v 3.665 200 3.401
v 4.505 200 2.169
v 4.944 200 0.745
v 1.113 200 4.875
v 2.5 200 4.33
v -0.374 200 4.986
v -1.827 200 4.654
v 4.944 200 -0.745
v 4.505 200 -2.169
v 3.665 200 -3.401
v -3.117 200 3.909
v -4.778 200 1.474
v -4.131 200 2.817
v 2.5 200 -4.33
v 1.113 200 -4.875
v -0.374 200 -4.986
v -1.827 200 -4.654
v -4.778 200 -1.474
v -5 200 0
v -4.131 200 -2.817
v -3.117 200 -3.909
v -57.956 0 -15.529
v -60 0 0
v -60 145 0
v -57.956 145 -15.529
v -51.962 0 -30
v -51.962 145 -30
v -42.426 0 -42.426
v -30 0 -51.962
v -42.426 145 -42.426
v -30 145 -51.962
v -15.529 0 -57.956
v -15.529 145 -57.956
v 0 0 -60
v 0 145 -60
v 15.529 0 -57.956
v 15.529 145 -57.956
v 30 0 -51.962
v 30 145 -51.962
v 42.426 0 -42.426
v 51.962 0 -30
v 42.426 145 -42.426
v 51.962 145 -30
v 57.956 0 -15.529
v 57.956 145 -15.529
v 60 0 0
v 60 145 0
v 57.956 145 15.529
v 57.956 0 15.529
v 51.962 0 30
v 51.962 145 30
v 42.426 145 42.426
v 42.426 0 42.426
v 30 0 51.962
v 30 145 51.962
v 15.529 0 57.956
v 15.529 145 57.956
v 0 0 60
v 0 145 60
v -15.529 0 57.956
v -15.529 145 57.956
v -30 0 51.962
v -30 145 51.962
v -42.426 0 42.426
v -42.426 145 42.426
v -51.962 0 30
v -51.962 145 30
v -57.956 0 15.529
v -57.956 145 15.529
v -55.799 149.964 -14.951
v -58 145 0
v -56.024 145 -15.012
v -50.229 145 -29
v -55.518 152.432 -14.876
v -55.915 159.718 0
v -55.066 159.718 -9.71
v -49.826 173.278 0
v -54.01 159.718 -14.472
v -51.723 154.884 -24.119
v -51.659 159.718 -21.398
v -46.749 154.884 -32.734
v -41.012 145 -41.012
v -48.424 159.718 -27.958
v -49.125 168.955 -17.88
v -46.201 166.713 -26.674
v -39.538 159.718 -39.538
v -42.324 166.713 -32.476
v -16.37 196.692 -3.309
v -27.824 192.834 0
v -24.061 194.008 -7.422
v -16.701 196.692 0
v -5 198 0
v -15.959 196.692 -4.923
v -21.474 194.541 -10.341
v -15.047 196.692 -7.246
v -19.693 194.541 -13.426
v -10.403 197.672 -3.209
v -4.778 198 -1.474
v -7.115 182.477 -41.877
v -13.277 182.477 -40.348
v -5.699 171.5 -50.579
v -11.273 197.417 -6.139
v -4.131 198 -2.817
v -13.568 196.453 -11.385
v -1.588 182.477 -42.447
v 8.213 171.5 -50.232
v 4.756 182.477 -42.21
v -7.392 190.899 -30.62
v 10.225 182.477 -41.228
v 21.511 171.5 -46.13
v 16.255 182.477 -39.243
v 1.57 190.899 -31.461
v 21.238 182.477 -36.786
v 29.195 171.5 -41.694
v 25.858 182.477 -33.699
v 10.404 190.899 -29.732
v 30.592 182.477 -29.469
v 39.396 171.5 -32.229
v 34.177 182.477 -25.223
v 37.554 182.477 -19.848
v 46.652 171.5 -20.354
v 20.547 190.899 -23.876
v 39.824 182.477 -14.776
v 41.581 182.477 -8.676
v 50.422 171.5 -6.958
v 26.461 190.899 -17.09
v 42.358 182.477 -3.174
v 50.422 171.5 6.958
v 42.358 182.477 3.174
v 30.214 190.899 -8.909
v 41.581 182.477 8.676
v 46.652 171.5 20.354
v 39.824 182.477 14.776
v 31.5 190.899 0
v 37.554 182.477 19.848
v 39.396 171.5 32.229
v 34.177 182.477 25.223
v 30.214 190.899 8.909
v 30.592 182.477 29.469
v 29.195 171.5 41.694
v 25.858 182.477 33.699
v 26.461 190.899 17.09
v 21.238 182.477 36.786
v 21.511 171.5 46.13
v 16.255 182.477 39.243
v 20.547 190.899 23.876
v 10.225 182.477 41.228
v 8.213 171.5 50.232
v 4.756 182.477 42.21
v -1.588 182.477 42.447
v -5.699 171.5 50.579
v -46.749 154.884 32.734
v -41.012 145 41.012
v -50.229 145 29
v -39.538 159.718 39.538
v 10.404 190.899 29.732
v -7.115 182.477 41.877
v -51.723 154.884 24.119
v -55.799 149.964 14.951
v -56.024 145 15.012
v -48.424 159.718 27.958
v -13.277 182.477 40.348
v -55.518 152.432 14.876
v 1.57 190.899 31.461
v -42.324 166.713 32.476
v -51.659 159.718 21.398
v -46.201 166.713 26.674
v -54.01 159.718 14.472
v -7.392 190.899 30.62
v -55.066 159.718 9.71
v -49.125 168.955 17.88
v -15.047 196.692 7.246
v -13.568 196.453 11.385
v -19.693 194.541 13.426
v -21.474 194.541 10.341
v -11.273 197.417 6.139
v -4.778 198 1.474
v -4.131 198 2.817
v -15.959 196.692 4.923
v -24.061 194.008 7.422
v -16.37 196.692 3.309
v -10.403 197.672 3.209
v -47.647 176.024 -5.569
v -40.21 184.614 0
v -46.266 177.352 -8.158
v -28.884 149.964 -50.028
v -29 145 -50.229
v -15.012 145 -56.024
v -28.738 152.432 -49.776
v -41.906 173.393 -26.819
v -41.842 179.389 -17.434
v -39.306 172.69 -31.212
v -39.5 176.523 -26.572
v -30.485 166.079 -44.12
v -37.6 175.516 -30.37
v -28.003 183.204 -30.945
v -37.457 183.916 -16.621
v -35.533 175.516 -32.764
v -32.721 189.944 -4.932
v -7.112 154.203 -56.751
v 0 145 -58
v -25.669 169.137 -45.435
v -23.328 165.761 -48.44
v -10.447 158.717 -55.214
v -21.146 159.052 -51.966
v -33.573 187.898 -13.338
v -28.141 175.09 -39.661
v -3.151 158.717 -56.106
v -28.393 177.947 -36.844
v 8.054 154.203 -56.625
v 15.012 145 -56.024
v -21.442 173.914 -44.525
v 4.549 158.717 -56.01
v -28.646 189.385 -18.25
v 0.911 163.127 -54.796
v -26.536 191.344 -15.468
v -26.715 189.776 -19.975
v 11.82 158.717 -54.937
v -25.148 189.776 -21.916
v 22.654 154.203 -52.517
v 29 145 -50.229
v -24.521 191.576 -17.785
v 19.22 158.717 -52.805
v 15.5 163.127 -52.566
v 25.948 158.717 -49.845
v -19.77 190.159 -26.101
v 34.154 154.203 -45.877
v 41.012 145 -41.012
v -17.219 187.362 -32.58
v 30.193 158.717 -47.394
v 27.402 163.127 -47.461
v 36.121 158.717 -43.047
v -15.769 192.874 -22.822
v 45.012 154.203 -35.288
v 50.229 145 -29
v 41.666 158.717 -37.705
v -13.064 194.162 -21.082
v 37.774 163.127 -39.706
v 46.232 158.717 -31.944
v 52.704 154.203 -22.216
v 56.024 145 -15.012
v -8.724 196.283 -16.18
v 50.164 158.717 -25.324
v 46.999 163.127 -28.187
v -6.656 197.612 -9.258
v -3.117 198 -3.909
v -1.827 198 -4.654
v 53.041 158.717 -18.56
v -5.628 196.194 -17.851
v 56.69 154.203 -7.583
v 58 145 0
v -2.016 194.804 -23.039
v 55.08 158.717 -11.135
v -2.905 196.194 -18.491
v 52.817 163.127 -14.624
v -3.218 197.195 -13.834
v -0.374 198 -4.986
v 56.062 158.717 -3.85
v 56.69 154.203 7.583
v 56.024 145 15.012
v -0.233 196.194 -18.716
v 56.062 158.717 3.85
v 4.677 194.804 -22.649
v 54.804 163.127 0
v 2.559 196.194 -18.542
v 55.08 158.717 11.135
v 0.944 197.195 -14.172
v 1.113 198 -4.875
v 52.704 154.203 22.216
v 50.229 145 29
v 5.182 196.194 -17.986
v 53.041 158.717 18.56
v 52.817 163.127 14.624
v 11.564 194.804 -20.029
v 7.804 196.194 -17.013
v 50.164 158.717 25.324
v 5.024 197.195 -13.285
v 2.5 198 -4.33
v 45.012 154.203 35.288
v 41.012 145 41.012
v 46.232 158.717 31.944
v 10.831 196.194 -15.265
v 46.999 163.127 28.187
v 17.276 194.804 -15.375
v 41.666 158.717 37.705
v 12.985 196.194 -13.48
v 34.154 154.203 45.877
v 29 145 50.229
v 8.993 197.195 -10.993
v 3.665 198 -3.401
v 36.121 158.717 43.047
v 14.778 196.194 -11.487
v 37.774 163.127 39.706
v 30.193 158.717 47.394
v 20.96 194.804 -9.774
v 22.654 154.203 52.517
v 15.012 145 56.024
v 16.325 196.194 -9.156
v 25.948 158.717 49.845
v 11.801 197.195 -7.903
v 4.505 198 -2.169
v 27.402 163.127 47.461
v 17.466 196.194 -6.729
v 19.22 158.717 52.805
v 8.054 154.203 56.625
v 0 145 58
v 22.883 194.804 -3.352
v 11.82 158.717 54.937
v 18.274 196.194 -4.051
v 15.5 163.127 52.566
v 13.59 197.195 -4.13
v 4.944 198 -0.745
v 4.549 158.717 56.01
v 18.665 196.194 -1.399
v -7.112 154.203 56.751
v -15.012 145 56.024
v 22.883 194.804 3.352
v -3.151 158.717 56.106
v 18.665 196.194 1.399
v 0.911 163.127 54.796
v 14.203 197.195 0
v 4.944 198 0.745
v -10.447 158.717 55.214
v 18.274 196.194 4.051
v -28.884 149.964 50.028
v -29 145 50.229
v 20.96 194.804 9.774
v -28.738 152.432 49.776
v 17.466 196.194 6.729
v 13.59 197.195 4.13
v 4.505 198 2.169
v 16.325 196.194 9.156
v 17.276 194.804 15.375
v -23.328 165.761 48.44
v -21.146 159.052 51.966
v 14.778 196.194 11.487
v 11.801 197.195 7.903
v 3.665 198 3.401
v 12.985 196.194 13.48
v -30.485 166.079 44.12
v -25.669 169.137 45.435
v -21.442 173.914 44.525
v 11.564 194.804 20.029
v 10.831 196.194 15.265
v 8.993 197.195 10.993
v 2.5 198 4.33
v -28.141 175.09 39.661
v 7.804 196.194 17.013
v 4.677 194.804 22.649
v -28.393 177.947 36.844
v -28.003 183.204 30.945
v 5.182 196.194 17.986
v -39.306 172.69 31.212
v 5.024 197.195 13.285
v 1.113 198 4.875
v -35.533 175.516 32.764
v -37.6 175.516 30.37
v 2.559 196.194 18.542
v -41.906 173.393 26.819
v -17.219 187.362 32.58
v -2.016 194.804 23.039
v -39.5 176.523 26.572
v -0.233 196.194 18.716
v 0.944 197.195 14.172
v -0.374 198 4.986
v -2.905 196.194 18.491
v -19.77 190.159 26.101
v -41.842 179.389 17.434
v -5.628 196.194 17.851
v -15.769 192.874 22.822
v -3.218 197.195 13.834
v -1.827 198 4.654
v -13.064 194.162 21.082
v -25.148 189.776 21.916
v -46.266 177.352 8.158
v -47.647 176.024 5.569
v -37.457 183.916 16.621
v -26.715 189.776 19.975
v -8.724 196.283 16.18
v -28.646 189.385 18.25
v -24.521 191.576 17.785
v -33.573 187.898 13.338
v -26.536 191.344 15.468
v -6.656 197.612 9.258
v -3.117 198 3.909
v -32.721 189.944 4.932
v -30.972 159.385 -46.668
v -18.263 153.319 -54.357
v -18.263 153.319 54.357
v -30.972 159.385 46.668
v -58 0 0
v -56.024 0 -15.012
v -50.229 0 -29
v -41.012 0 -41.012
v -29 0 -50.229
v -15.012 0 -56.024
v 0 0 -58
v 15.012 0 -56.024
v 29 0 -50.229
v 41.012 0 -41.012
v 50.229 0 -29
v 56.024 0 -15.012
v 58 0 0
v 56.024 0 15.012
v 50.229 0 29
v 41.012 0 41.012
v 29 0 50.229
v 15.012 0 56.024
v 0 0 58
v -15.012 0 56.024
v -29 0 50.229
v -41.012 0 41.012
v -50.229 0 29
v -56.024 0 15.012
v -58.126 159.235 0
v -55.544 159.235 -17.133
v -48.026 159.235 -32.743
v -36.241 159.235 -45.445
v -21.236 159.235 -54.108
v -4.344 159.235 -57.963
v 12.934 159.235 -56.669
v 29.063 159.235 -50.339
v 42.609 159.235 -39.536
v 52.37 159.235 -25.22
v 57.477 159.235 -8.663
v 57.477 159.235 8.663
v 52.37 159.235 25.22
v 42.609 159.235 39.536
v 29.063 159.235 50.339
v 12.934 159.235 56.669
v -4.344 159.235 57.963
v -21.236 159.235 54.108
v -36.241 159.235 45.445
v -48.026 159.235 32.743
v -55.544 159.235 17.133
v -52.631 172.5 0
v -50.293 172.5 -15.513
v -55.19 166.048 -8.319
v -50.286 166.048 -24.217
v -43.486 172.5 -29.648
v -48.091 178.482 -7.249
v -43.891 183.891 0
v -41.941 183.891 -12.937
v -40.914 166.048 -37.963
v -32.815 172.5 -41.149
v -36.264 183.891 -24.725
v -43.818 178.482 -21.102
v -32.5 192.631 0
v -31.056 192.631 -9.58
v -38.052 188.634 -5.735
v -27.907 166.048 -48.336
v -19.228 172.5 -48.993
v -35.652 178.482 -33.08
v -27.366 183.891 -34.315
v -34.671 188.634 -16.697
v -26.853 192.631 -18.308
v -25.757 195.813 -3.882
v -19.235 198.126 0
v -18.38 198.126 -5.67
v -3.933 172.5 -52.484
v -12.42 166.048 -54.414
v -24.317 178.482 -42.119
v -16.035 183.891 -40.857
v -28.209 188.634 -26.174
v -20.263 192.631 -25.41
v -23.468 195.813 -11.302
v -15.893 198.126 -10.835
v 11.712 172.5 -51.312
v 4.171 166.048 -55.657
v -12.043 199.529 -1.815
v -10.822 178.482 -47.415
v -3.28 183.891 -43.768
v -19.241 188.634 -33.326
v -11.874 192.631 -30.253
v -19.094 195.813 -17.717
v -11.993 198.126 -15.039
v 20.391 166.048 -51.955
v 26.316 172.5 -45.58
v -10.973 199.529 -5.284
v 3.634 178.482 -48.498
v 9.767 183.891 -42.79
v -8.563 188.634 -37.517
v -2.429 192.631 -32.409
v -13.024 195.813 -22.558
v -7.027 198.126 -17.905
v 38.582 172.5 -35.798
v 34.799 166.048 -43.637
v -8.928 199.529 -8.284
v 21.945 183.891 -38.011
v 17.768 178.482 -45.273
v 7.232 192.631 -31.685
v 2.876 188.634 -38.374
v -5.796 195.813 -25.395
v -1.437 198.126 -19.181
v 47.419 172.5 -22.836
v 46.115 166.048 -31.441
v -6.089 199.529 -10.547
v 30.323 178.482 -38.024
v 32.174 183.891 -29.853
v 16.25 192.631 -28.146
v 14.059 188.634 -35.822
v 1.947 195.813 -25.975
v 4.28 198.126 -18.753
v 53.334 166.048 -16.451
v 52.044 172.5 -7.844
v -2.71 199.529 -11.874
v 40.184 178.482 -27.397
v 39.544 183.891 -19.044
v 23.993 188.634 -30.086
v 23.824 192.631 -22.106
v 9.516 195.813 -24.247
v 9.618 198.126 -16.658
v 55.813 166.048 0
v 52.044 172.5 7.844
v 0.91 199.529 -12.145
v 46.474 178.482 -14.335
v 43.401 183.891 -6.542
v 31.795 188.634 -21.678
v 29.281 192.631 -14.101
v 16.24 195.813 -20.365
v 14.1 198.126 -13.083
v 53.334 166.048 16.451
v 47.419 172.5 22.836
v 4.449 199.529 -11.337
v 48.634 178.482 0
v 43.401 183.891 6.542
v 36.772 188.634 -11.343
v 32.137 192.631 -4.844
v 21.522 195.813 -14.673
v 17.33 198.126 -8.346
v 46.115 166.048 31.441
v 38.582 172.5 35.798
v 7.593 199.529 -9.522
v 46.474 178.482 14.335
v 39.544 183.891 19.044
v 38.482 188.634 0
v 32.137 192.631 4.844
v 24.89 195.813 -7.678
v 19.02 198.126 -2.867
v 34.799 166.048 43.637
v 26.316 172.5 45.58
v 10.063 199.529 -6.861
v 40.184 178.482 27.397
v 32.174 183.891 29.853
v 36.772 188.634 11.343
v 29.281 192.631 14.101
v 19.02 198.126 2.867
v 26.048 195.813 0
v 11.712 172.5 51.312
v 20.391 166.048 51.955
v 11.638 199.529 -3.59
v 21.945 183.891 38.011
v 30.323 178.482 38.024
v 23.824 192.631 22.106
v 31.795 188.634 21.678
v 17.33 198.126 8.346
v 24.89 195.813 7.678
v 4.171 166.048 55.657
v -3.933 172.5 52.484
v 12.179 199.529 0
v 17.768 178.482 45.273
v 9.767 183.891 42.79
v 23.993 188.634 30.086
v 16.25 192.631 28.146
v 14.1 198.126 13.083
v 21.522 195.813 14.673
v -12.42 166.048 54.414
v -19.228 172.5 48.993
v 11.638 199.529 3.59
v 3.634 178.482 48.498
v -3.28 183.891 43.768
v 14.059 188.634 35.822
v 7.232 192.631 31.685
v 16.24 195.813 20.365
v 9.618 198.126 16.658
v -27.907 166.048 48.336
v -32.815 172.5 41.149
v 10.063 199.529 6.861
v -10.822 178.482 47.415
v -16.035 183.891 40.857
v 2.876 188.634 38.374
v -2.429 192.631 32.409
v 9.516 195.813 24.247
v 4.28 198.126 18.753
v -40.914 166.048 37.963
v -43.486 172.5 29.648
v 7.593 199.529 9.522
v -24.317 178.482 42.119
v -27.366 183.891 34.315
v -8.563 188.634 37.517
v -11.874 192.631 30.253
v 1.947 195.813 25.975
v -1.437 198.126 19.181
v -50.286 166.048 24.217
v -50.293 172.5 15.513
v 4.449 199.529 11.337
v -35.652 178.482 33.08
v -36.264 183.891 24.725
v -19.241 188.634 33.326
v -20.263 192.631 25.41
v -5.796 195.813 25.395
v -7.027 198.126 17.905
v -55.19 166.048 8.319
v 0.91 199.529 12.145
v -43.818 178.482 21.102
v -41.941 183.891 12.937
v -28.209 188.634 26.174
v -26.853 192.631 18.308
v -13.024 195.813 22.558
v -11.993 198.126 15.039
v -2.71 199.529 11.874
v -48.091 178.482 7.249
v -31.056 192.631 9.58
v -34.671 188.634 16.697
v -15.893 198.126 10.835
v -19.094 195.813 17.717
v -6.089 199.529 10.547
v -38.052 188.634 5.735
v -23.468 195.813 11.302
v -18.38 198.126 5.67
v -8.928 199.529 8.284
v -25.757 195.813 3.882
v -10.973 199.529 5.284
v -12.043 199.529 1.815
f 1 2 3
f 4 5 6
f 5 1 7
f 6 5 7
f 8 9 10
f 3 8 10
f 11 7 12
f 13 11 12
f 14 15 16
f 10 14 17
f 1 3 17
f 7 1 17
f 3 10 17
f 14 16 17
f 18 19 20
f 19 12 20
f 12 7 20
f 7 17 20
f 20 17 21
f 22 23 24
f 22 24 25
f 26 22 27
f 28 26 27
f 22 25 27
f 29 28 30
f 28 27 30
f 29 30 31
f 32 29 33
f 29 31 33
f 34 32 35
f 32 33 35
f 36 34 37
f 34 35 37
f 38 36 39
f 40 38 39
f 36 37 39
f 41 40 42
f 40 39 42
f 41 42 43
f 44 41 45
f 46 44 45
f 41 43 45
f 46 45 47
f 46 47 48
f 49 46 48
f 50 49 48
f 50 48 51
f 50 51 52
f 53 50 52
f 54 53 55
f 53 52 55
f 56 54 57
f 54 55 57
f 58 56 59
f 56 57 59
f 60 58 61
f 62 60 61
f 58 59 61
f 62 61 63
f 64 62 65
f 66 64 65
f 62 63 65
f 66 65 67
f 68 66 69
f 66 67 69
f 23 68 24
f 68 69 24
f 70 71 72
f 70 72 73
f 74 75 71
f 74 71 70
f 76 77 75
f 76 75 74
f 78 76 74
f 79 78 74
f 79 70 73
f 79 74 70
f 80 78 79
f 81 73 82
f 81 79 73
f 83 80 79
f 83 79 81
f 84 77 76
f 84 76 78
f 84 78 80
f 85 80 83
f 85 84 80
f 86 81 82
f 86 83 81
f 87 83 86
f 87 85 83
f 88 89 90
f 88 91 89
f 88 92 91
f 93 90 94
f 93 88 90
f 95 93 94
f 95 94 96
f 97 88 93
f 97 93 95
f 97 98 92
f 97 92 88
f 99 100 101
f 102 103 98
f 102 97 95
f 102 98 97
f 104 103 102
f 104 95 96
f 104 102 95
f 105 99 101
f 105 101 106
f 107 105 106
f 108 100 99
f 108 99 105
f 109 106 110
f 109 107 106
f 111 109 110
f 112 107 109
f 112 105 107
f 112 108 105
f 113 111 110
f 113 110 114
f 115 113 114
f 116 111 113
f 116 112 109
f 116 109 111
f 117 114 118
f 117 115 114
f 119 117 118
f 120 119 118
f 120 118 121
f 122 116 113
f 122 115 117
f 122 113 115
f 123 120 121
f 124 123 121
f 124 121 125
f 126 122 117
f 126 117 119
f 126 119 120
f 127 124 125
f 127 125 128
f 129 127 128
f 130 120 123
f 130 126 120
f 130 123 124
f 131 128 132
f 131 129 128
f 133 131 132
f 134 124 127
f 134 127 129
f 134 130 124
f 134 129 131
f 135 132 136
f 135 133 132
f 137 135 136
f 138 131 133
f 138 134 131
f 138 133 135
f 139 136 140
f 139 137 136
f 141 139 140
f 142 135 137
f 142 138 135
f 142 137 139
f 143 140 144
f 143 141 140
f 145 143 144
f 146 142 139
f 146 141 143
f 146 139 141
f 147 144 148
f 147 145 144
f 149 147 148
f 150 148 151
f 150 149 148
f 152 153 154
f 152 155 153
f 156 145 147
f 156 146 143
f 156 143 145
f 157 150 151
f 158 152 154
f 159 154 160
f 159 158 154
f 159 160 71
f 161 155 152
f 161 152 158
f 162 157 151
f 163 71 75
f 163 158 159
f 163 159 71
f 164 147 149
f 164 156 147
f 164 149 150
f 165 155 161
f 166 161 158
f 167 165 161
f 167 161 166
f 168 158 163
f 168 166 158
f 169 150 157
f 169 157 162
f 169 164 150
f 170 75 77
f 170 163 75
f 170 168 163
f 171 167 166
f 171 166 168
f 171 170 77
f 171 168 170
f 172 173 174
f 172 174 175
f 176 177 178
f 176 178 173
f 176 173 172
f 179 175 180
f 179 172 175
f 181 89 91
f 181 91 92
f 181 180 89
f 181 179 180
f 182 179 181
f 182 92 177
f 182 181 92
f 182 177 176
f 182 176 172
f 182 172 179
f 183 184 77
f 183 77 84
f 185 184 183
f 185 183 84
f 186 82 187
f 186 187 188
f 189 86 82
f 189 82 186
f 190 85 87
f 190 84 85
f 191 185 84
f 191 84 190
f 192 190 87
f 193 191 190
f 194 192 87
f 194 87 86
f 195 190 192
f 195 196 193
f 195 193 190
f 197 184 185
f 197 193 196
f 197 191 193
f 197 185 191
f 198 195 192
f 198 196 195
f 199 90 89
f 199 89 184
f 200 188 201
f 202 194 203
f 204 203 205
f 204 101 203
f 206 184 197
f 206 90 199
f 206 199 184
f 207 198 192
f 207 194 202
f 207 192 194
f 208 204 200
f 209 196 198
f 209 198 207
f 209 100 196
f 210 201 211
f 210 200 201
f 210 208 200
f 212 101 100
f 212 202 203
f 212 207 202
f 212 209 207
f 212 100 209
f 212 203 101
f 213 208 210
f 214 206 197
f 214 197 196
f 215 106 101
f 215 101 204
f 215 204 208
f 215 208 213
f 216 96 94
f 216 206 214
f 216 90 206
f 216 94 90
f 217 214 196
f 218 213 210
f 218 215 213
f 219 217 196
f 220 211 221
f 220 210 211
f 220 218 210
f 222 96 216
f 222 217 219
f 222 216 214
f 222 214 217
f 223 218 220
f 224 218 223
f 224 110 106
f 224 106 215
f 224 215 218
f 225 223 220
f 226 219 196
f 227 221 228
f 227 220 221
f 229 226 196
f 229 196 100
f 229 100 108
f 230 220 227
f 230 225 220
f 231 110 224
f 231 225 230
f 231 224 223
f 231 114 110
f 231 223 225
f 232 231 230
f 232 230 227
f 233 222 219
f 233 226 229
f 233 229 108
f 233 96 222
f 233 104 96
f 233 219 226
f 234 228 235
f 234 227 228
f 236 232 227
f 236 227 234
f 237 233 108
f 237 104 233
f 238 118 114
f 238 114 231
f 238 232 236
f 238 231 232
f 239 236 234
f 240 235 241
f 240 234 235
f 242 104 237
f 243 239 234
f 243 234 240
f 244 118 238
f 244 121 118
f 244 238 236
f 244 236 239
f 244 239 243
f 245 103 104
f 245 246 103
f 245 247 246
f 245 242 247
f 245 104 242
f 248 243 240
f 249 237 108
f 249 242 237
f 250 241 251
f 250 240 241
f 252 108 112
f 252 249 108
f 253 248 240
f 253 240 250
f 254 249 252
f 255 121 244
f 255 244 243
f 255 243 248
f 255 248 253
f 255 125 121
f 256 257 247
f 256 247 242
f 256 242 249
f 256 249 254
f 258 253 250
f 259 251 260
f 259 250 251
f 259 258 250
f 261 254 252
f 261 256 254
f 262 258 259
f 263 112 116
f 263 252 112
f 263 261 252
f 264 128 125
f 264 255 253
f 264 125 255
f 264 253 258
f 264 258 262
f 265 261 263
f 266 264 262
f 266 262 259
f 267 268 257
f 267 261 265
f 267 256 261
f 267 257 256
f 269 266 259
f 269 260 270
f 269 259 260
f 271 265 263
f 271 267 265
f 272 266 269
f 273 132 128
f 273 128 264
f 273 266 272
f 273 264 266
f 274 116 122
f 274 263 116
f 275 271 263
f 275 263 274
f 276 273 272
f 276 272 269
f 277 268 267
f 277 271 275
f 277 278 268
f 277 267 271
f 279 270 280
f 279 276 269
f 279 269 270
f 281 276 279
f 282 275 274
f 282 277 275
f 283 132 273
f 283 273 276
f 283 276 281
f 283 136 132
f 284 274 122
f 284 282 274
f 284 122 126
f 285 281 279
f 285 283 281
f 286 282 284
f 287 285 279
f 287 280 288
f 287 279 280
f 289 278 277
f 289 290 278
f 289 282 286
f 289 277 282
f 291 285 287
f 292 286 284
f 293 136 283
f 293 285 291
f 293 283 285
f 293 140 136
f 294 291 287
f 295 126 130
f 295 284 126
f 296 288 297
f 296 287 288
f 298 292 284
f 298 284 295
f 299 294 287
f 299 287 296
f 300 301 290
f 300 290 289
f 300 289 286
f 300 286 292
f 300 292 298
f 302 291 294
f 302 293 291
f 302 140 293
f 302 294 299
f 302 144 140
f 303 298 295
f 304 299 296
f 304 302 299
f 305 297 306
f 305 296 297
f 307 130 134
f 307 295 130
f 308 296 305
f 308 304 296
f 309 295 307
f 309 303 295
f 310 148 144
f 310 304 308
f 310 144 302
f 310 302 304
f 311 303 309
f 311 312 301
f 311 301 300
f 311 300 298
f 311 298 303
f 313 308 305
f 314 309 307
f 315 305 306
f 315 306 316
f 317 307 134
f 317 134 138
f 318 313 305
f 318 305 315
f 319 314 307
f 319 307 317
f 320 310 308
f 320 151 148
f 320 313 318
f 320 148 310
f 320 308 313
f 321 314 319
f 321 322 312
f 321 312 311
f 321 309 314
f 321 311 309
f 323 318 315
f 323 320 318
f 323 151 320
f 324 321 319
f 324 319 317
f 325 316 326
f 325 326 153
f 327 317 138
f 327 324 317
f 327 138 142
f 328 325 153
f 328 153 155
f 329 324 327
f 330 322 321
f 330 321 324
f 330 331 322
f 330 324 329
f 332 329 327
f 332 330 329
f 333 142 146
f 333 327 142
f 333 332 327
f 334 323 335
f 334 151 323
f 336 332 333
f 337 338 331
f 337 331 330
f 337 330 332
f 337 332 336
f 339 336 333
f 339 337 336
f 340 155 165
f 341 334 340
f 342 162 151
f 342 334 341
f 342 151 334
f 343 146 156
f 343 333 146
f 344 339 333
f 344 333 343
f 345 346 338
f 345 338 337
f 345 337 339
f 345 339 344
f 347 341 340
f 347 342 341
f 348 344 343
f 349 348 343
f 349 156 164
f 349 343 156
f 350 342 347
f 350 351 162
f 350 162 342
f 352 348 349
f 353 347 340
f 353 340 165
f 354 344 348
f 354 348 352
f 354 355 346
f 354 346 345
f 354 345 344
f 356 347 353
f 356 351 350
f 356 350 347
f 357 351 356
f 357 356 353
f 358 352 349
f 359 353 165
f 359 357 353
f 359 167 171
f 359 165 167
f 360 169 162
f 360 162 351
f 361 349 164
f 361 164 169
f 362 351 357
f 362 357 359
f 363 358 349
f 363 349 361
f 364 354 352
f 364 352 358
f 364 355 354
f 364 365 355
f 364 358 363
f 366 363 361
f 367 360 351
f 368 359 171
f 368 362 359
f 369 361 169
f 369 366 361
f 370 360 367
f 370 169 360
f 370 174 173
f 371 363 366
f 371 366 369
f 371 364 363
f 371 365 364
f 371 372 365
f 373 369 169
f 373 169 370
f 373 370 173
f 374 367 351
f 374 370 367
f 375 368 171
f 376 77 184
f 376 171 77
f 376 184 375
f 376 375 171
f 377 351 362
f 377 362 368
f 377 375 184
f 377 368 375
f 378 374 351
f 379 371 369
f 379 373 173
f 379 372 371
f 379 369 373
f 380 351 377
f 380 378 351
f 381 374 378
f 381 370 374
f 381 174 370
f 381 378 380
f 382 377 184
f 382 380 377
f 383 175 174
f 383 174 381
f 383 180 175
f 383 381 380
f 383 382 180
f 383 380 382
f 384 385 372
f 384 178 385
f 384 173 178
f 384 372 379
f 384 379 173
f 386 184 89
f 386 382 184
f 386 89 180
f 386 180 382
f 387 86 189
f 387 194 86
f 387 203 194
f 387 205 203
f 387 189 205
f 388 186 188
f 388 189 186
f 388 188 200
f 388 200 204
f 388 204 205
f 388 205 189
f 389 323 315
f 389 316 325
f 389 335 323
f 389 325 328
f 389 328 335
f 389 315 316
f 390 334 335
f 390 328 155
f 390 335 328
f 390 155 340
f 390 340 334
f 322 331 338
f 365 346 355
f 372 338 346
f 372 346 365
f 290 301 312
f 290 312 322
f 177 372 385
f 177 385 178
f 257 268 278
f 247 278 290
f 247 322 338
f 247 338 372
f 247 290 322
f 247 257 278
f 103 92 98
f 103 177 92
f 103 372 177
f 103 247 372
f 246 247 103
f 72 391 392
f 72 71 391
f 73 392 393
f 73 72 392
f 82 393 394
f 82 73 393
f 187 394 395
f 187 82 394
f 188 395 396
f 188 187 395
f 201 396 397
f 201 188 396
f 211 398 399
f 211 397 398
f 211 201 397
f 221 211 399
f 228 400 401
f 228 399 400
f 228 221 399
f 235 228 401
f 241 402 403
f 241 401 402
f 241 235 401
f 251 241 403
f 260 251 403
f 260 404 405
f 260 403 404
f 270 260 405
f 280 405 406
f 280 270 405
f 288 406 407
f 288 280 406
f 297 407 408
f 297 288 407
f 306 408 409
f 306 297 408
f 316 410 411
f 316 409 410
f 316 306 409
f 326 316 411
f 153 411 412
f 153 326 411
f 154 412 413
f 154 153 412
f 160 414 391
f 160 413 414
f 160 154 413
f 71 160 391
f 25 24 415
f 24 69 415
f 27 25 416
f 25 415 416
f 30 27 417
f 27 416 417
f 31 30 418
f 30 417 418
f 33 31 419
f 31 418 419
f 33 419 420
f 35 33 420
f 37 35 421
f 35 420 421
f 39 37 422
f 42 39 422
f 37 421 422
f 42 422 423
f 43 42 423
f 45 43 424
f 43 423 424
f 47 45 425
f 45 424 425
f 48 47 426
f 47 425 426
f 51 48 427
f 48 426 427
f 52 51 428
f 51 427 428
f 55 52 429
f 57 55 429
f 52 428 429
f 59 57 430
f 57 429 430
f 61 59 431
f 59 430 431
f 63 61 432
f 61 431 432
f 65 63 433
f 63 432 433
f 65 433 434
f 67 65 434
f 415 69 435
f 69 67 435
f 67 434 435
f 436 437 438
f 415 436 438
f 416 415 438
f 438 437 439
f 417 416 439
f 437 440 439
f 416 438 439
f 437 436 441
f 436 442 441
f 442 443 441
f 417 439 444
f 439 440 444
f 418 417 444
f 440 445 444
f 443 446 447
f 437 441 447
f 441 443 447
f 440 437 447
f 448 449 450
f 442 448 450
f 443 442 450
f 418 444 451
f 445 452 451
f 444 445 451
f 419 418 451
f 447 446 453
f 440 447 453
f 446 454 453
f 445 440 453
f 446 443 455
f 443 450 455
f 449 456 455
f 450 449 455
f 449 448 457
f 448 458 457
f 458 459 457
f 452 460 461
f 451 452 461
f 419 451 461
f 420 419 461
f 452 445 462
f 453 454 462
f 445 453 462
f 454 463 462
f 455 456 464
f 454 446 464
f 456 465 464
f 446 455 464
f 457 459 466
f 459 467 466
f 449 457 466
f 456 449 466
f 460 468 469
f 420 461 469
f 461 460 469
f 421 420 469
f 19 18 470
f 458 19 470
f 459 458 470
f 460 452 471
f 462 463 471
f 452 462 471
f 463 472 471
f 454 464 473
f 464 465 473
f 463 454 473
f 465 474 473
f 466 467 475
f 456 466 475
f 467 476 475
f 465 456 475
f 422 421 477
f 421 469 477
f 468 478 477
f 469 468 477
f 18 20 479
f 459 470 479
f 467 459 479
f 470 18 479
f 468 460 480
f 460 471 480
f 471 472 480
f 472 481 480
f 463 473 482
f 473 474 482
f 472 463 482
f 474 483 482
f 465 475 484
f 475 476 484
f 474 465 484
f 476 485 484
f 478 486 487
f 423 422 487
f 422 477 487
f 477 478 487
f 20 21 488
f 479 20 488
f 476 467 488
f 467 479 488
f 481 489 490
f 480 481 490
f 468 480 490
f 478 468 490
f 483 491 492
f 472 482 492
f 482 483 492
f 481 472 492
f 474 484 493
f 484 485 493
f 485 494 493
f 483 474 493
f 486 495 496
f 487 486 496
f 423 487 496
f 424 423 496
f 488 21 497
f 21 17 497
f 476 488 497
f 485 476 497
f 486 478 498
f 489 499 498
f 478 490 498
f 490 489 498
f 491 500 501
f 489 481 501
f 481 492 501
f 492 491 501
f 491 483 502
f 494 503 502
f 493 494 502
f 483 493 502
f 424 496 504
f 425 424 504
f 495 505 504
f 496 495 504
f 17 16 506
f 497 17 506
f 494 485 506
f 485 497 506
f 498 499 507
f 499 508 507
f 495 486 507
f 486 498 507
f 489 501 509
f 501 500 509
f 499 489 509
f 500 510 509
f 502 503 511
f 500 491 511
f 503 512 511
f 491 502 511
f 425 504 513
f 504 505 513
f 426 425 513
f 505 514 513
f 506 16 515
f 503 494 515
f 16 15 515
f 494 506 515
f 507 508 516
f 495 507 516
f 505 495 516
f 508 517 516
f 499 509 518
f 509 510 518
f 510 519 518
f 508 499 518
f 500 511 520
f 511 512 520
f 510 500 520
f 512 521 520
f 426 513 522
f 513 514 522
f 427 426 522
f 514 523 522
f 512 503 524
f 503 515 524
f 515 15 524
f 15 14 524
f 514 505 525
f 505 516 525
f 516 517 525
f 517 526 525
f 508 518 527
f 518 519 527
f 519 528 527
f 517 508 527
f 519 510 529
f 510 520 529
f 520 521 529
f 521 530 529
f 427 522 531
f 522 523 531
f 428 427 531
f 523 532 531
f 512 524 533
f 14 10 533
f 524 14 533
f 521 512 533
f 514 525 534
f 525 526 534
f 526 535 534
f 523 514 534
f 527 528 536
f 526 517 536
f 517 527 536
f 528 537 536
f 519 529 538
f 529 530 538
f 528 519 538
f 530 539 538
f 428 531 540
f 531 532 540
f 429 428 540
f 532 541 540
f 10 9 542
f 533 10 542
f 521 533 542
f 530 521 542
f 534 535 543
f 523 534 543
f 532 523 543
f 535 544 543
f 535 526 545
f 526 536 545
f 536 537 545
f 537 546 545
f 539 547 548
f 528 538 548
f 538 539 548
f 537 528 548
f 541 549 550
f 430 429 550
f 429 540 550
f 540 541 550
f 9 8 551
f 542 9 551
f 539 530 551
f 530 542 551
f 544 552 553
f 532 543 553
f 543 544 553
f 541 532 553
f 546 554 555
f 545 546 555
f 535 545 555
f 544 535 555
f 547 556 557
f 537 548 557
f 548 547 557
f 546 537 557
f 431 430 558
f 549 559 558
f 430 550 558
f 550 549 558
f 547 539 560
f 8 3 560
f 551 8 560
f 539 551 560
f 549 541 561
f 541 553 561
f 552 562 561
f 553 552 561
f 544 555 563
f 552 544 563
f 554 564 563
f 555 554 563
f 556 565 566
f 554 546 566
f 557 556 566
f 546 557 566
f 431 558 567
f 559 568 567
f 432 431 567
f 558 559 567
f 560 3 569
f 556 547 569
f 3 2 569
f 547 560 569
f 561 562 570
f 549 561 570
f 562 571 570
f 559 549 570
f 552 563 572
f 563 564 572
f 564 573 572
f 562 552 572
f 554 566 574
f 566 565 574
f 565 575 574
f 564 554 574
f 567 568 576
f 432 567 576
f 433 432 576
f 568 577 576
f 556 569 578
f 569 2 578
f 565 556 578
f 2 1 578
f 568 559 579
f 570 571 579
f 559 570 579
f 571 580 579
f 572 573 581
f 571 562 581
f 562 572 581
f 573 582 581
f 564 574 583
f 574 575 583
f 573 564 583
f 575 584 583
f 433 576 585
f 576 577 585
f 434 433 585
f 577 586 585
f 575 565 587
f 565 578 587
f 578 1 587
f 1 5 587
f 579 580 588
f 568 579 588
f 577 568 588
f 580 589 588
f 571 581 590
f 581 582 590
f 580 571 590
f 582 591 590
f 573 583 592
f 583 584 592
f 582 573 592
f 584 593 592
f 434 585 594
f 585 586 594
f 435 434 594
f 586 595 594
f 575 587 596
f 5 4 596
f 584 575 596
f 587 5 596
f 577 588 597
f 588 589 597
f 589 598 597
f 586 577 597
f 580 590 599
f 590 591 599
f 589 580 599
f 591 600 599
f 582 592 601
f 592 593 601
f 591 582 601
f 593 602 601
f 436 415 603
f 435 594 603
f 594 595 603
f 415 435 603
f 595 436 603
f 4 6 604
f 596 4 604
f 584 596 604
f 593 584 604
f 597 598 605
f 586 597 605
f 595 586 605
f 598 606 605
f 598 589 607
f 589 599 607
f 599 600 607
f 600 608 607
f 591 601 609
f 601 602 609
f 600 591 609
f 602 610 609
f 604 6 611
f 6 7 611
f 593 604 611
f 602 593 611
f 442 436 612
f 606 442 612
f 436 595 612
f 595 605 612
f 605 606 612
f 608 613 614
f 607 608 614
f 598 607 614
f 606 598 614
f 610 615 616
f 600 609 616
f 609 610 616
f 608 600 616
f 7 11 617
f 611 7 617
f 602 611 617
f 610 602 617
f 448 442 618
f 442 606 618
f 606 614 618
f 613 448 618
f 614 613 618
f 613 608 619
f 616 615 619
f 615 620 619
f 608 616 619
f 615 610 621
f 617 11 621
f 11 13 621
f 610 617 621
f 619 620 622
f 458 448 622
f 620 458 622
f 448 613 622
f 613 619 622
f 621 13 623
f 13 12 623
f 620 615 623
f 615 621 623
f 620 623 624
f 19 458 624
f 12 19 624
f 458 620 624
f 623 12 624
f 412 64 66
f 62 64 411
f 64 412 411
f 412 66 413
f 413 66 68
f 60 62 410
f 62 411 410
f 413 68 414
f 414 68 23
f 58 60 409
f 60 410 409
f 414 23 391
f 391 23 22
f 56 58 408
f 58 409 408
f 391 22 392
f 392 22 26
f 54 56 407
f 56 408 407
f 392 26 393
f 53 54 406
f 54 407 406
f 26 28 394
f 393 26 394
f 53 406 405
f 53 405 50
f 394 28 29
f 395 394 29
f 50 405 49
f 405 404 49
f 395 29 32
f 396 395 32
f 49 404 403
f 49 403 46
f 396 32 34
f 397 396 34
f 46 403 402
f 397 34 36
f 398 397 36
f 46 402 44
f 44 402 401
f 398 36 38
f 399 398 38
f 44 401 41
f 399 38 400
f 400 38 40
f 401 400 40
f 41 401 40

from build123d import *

# Parameters (mm, degrees)
SHELL1_T = -2


with BuildPart() as part:
    # Sketch1 → Revolve1 (revolve)
    with BuildSketch(Plane.XY, mode=Mode.PRIVATE) as revolve1_sk:
        with BuildLine():
            Line((0, 0), (60, 0))
            Line((60, 0), (60, 145))
            ThreePointArc((60, 145), (43.890872965, 183.890872965), (5, 200))
            Line((5, 200), (0, 200))
            Line((0, 200), (0, 0))
        make_face()
    revolve(revolve1_sk.sketch.rotate(Axis((0, 200, 0), (0, -1, 0)), 180), axis=Axis((0, 200, 0), (0, -1, 0)))

    # Shell1
    shell1_openings = [part.faces().sort_by_distance(p)[0] for p in [
        (0, 0, 0),
    ]]
    offset(amount=SHELL1_T, openings=shell1_openings, kind=Kind.INTERSECTION)


solid = part.part
